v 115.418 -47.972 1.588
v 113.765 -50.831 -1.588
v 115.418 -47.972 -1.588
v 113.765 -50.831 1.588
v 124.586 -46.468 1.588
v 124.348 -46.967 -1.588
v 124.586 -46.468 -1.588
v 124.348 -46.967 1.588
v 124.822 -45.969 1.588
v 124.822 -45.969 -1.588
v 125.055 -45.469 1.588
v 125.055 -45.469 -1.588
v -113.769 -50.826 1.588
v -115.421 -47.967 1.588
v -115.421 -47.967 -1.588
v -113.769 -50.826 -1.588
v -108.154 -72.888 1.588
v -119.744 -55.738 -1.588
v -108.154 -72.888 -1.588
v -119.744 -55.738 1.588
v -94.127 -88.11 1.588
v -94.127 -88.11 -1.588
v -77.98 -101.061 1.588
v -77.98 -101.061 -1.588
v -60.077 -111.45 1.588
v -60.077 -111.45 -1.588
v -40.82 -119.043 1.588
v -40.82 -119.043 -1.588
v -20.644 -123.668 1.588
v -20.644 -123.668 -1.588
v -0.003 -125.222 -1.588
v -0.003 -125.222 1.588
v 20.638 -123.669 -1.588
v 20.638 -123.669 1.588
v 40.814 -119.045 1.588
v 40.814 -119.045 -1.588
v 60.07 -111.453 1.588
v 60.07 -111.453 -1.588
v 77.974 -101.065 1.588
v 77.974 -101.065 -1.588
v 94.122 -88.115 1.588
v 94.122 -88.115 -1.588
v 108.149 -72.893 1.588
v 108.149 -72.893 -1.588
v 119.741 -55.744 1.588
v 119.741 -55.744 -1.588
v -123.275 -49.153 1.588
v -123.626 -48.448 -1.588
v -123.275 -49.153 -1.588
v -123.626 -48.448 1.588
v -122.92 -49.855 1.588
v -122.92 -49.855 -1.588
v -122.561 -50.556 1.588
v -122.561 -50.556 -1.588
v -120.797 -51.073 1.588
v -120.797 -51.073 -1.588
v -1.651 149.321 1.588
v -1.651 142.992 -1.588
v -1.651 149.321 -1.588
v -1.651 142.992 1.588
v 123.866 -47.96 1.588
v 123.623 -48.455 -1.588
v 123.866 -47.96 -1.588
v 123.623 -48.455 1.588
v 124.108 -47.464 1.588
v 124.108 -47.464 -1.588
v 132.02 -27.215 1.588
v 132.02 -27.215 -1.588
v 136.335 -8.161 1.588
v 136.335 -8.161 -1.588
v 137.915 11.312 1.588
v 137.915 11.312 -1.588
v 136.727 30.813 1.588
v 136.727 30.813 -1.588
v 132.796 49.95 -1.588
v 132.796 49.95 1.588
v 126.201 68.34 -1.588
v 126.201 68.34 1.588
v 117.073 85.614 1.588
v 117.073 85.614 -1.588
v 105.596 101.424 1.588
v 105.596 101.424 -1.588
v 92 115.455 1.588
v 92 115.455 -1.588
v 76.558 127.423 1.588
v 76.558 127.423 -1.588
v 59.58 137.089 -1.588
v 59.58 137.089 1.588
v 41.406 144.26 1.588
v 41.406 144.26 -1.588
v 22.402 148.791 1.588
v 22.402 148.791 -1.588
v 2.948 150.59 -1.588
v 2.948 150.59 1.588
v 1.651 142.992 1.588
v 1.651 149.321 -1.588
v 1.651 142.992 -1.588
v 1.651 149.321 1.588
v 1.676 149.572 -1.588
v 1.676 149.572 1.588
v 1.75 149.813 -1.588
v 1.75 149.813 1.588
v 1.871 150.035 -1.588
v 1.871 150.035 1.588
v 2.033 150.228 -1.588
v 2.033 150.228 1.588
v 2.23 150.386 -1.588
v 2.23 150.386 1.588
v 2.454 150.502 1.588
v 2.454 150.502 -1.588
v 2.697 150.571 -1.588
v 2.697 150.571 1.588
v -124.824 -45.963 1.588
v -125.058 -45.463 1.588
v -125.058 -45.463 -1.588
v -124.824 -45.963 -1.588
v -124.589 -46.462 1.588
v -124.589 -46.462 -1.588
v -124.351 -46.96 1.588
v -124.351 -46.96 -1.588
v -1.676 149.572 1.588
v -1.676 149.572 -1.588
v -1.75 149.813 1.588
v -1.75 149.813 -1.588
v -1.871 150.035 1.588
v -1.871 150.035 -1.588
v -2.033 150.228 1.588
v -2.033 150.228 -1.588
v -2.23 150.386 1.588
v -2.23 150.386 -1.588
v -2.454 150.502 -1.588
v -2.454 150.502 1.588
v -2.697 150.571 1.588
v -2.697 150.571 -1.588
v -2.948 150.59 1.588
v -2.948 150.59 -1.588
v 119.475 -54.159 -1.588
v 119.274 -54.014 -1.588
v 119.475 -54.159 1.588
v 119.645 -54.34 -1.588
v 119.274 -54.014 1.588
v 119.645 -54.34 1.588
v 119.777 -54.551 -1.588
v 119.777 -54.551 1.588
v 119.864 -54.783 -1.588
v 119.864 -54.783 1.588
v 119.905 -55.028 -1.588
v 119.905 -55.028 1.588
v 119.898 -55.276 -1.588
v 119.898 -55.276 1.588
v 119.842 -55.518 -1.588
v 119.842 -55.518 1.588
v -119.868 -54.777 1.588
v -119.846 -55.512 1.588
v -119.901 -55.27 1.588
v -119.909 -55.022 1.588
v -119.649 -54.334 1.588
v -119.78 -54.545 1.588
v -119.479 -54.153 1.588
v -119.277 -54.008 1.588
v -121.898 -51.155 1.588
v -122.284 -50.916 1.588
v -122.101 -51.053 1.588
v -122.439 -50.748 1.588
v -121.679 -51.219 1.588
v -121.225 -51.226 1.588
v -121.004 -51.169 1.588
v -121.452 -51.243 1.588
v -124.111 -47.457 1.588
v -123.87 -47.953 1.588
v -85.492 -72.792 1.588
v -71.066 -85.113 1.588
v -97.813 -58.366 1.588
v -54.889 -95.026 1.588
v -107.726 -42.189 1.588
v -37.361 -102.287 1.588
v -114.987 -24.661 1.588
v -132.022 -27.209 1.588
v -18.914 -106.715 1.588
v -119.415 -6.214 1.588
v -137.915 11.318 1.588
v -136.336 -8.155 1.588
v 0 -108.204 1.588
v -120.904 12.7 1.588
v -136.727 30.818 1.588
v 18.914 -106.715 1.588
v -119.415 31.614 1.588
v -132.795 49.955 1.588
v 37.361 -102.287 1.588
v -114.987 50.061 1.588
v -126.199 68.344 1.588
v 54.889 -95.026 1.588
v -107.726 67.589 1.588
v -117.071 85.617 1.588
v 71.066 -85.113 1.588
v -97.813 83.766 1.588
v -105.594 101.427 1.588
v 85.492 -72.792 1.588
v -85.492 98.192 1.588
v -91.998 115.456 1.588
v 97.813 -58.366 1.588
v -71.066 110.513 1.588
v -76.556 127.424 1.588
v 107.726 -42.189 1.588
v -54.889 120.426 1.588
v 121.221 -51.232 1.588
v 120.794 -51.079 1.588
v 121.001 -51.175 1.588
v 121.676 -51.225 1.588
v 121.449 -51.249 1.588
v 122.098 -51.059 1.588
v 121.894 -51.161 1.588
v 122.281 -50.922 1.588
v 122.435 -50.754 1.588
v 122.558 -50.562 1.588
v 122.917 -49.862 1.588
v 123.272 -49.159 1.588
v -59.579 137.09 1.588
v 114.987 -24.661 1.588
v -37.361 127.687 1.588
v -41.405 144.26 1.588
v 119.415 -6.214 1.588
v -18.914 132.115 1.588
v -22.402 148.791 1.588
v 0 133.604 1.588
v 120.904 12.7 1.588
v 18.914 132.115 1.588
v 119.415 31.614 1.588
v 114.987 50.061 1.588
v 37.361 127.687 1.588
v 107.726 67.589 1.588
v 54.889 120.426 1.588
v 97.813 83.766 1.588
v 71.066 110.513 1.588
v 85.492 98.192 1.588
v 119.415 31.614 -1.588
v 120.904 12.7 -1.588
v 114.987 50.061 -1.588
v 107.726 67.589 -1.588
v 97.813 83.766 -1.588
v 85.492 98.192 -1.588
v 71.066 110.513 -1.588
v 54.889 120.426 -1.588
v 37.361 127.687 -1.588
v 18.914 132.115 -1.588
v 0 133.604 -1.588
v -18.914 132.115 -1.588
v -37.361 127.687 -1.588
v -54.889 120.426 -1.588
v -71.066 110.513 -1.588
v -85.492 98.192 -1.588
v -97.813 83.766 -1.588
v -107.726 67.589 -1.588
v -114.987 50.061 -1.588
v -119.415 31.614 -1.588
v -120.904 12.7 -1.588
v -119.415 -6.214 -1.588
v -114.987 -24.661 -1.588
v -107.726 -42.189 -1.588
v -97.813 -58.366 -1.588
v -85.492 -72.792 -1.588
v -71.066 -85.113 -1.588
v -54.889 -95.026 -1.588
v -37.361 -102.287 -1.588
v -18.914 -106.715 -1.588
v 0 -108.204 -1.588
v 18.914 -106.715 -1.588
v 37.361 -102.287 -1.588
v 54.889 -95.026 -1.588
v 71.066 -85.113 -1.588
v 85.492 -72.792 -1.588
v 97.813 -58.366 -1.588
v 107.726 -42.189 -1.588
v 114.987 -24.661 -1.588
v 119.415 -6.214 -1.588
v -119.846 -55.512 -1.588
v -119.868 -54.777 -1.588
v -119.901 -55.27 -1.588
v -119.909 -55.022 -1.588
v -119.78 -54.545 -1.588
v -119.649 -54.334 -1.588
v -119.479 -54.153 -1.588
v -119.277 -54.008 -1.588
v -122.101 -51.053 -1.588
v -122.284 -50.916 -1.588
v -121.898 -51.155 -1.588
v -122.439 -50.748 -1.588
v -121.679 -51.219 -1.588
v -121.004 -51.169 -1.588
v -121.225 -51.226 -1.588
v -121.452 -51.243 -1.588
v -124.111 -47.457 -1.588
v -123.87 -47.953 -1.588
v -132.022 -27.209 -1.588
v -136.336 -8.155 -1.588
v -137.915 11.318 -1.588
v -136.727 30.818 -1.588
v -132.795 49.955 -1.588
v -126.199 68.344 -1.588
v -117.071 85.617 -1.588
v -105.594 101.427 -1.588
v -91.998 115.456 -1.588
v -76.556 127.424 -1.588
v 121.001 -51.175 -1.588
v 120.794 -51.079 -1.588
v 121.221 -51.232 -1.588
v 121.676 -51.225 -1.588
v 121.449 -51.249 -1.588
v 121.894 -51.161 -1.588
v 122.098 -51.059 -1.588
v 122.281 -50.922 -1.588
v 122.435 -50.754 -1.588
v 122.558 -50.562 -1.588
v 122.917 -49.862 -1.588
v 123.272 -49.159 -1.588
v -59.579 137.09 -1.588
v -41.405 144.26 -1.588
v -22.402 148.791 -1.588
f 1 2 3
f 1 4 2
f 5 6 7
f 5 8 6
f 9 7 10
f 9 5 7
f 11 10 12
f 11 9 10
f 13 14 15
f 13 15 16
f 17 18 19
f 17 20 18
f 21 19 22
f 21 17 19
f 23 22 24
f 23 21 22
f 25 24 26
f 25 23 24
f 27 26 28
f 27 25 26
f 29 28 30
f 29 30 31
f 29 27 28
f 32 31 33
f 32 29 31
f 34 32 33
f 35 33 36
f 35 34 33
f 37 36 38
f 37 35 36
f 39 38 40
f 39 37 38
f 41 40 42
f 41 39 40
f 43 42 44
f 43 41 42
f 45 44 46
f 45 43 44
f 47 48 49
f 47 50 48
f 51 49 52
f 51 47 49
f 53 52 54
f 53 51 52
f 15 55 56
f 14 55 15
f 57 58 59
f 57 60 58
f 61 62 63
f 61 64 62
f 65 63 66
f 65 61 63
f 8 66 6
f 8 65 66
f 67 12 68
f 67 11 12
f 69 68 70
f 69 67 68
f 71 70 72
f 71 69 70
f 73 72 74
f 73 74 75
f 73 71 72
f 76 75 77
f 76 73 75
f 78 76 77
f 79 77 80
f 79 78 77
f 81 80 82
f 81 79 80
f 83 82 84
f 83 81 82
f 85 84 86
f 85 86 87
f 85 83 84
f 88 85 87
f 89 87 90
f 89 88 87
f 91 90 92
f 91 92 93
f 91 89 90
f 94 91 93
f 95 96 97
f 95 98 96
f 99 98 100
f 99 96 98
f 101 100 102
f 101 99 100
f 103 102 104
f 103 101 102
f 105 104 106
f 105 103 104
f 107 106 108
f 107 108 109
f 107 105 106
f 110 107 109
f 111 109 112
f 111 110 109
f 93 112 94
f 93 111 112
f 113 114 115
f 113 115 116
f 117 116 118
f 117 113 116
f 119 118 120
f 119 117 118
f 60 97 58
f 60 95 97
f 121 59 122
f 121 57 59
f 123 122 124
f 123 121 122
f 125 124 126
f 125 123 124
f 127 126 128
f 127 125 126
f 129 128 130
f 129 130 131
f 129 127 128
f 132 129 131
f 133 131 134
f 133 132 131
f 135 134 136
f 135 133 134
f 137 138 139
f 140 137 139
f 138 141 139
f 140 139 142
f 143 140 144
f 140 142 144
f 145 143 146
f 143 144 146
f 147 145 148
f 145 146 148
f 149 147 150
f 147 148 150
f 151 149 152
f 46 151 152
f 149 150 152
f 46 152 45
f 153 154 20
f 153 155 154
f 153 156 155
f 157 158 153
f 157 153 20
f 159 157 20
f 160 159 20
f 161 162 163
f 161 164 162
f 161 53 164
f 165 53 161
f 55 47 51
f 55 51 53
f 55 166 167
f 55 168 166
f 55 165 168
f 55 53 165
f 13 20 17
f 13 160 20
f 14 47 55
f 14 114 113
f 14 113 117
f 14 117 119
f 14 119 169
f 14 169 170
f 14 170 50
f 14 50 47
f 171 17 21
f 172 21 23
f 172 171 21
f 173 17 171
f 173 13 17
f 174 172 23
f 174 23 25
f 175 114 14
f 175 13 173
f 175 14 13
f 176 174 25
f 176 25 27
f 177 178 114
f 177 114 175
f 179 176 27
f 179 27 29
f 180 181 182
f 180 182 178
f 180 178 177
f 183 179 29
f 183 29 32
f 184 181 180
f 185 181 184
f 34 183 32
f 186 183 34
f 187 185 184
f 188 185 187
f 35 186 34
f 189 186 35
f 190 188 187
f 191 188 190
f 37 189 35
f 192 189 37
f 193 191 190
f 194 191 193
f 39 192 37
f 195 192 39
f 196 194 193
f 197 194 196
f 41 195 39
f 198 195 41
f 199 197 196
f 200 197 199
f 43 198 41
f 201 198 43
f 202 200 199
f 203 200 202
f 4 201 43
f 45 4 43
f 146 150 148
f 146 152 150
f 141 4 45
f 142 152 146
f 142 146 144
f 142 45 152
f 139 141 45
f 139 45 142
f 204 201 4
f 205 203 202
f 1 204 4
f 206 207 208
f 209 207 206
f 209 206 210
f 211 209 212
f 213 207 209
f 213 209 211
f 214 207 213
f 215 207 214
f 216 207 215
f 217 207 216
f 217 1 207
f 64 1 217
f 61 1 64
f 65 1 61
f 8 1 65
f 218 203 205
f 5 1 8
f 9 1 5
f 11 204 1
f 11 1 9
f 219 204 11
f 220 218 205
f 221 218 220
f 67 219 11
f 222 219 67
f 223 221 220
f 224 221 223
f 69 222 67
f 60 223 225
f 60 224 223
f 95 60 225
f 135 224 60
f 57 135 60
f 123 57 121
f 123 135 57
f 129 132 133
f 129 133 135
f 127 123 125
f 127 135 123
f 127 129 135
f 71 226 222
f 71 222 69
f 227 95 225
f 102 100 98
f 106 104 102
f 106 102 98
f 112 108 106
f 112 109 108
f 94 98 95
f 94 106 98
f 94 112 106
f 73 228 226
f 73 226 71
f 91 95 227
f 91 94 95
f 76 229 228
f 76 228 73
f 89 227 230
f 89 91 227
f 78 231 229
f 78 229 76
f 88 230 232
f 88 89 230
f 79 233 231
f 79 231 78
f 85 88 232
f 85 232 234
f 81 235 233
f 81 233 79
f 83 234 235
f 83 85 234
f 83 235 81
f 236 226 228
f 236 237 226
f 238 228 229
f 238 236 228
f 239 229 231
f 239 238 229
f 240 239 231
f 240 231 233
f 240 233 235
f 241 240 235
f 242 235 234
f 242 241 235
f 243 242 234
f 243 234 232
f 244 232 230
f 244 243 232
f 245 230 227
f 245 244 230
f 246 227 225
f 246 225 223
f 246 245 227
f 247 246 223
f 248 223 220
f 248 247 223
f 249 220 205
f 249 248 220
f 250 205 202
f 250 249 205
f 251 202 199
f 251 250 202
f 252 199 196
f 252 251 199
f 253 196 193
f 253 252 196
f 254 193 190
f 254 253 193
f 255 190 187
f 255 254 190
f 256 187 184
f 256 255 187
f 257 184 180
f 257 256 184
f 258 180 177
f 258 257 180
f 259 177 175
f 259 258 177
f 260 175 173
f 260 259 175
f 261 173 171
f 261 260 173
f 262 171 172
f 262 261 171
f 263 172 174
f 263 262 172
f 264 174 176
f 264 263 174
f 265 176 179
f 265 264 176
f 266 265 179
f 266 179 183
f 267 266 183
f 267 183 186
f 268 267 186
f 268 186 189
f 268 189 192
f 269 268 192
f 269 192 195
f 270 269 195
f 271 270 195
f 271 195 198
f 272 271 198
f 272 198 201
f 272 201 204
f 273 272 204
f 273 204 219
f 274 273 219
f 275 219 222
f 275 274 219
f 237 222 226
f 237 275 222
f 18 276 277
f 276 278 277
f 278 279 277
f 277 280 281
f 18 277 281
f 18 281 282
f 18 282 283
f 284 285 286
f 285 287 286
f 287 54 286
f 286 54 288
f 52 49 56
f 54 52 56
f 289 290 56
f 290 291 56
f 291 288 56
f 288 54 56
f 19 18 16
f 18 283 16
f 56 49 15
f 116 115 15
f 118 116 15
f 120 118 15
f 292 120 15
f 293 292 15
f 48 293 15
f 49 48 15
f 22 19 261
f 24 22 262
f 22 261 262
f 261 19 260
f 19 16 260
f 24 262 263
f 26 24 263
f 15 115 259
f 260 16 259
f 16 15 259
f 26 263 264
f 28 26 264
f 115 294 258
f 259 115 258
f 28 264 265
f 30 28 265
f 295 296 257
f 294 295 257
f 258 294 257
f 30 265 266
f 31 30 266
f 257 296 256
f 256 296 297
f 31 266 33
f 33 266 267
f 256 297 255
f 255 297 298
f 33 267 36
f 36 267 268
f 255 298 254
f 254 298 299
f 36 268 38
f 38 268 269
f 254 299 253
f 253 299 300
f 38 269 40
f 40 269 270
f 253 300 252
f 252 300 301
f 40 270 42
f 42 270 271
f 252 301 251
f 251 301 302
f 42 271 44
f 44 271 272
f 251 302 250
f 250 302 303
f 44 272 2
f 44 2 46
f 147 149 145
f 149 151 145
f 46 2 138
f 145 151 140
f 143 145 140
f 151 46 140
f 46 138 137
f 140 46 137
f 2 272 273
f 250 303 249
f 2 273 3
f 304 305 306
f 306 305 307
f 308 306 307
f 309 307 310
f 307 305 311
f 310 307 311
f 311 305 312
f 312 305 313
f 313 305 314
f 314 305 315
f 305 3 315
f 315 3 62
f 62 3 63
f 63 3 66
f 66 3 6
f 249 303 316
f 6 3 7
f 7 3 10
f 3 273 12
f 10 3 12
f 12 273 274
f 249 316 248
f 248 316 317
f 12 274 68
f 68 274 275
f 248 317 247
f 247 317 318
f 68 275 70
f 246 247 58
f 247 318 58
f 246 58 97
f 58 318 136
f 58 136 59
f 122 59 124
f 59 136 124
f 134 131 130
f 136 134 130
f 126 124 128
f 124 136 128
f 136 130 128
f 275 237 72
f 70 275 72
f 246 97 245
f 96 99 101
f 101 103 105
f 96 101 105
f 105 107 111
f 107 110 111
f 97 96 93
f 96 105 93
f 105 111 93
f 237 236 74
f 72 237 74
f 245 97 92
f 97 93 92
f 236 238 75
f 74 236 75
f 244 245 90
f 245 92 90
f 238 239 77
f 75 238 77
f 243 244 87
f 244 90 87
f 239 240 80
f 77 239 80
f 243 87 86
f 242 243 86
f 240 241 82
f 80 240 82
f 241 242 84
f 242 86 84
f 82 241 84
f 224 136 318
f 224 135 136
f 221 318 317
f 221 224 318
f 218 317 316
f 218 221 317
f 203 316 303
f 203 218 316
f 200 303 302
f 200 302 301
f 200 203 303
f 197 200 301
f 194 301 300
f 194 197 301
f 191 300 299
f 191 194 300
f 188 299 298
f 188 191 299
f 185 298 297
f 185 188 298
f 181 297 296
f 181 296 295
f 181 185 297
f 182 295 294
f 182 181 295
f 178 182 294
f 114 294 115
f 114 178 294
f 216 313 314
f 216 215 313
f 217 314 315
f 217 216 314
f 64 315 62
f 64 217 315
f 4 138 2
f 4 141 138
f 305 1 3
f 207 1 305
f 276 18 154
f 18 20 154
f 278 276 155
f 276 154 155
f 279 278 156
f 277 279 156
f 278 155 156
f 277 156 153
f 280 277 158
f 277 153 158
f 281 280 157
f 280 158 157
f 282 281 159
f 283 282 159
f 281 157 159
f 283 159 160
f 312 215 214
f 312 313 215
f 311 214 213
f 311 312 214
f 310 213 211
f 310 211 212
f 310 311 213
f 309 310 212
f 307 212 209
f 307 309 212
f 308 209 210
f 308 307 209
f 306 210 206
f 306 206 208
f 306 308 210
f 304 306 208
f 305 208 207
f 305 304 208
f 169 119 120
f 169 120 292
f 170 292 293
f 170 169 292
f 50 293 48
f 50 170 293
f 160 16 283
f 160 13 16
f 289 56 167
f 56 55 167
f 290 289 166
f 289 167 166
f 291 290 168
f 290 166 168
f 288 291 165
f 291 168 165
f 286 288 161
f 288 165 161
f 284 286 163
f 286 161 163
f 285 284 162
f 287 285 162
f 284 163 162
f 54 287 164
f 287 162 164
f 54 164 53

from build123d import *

# Parameters (mm, degrees)
SKETCH1_R           = 120.904
BOSS_EXTRUDE1_DEPTH = 1.5875
FILLET1_R           = 1.27


with BuildPart() as part:
    # Sketch1 → Boss-Extrude1 (new, symmetric)
    with BuildSketch(Plane.XY):
        with BuildLine():
            Line((-1.651, 142.99211797), (-1.651, 150.61211797))
            ThreePointArc((-1.651, 150.61211797), (-116.726759893, 86.166601996), (-125.058359506, -45.462572171))
            ThreePointArc((-125.058359506, -45.462572171), (-124.706816881, -46.212544567), (-124.350776736, -46.960392298))
            ThreePointArc((-124.350776736, -46.960392298), (-123.990582669, -47.705409471), (-123.625925064, -48.44825211))
            ThreePointArc((-123.625925064, -48.44825211), (-122.796227949, -50.097806374), (-121.944521887, -51.736105296))
            Line((-121.944521887, -51.736105296), (-115.42055631, -47.966631906))
            Line((-115.42055631, -47.966631906), (-113.768616335, -50.825704889))
            Line((-113.768616335, -50.825704889), (-120.366477065, -54.63787406))
            ThreePointArc((-120.366477065, -54.63787406), (-0.003414242, -125.221999958), (120.363143036, -54.643833293))
            Line((120.363143036, -54.643833293), (113.765475078, -50.831330502))
            Line((113.765475078, -50.831330502), (115.417559621, -47.972341054))
            Line((115.417559621, -47.972341054), (121.941331564, -51.742142581))
            ThreePointArc((121.941331564, -51.742142581), (122.79307438, -50.103972552), (123.622811136, -48.454547263))
            ThreePointArc((123.622811136, -48.454547263), (123.987506557, -47.711723215), (124.347738551, -46.966724405))
            ThreePointArc((124.347738551, -46.966724405), (124.703816766, -46.218894831), (125.055397569, -45.468940362))
            ThreePointArc((125.055397569, -45.468940362), (116.728630401, 86.163629972), (1.651, 150.61211797))
            Line((1.651, 150.61211797), (1.651, 142.99211797))
            Line((1.651, 142.99211797), (-1.651, 142.99211797))
        make_face()
        with Locations((0, 12.7)):
            Circle(SKETCH1_R, mode=Mode.SUBTRACT)
    extrude(amount=BOSS_EXTRUDE1_DEPTH, both=True)

    # Fillet1
    fillet1_edges = [part.edges().sort_by_distance(p)[0] for p in [
        (120.363143036, -54.643833293, 0),
        (-120.366477065, -54.63787406, 0),
        (-121.944521887, -51.736105296, 0),
        (-1.651, 150.61211797, 0),
        (1.651, 150.61211797, 0),
        (121.941331564, -51.742142581, 0),
    ]]
    fillet(fillet1_edges, radius=FILLET1_R)


solid = part.part
